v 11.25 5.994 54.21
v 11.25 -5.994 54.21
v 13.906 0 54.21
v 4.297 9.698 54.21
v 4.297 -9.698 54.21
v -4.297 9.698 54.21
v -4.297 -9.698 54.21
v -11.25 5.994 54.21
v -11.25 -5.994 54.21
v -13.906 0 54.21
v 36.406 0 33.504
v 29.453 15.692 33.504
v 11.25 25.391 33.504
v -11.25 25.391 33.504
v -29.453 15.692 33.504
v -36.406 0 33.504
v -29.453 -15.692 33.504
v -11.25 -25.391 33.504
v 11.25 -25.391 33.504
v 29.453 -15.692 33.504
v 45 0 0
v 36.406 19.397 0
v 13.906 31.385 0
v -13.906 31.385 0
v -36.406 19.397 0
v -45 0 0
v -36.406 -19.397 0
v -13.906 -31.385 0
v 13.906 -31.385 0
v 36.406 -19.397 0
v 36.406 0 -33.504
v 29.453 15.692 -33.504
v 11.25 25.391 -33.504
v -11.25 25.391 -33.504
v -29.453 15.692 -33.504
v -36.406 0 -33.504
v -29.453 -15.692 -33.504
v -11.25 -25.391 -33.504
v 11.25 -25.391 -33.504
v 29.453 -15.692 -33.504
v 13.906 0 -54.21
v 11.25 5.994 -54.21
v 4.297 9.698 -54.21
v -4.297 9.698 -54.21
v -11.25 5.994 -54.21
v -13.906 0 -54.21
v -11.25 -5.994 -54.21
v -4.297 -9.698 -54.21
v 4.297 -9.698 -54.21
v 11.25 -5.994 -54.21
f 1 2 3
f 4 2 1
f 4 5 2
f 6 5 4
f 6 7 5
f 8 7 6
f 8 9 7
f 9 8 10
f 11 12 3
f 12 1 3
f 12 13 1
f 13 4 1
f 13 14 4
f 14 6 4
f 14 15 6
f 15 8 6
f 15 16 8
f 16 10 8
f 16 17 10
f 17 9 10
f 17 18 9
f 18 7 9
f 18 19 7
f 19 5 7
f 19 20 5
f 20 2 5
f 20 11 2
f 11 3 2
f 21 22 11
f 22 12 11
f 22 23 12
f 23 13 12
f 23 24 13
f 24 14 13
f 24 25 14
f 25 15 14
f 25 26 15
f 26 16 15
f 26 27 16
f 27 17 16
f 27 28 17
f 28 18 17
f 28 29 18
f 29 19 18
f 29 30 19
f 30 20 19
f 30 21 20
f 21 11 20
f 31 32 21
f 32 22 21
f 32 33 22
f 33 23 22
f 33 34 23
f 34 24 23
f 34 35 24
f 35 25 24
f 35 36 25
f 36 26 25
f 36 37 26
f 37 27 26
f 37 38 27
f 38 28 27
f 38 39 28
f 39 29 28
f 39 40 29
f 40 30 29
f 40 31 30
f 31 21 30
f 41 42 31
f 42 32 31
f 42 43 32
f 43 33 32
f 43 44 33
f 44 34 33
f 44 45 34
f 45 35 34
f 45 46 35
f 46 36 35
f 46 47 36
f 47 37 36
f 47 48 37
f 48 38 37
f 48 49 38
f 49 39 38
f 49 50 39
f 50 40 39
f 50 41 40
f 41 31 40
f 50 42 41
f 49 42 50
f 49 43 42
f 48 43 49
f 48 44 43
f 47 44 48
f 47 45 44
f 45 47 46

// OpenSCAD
// Generated by SolidPython 1.0.1 on 2020-07-29 00:46:52


scale(v = [15, 11, 19]) {
	sphere(r = 3);
}
/***********************************************
*********      SolidPython code:      **********
************************************************
 
# import packages: SolidPython
from solid import *
from solid.utils import *
from itertools import chain, combinations, permutations


class Resize:

    def __init__(self, scad_file):
        self.scad_file = scad_file
        #self.scad_file = import_scad(scad_file)
        # cone/cylinder param:
        self.r1 = 0
        self.r2 = 0
        self.h = 0
        # rectangular prism param:
        self.w = 0
        self.l = 0
        # ellipse param:
        self.r = 0

    # import OpenScad code (file name corresponds to shape)


    # classify shape + parameters
    def assign(self, param1, param2, param3):
        if self.scad_file == 'cone.scad':
            self.r1 = param1
            self.r2 = param2
            self.h = param3
        elif self.scad_file == 'cylinder.scad':
            self.r1 = param1
            self.r2 = param2
            self.h = param3
        elif self.scad_file == 'rectangularPrism.scad':
            self.h = param1
            self.l = param2
            self.w = param3
        else:
            self.r = param1
            self.h = param2

    # resize parameters
    def iterate(self):
        x = range(3, 20, 2)
        i = 1
        if self.scad_file == 'cone.scad':
            tempList = list(permutations(x, 2))
            for temp in tempList:
                param1 = temp[0]
                param2 = temp[1]
                filepath = 'produced_scad_files/' + 'cone' + str(param1) + '_' + str(param2) + '_' + '.scad'
                scad_render_to_file(cylinder(h=param1, r1=param2, r2=0), filepath)

        elif self.scad_file == 'cylinder.scad':
            tempList = list(permutations(x, 3))
            for temp in tempList:
                param1 = temp[0]
                param2 = temp[1]
                filepath = 'produced_scad_files/' + 'cylinder' + str(param1) + '_' + str(param2) + '_' + '.scad'
                scad_render_to_file(cylinder(h=param1, r1=param2, r2=param2), filepath)

        elif self.scad_file == 'rectangularPrism.scad':
            tempList = list(permutations(x, 3))
            for temp in tempList:
                param1 = temp[0]
                param2 = temp[1]
                param3 = temp[2]
                filepath = 'produced_scad_files/' + 'rectangularPrism' + str(param1) + '_' + str(param2) + '_' + str(
                    param3) + '.scad'
                scad_render_to_file(cube(size=(param1, param2, param3)), filepath)

        elif self.scad_file == 'ellipse.scad':
            tempList = list(permutations(x, 4))
            for temp in tempList:
                param1 = temp[0]
                param2 = temp[1]
                param3 = temp[2]
                param4 = temp[3]
                filepath = 'produced_scad_files/' + 'ellipse' + str(param1) + '_' + str(param2) + '_' + str(param3) + '_' + str(param4) + '.scad'
                scad_render_to_file(scale([param1, param2, param3])(sphere(r=param4)), filepath)

    def render_to_scadfile(self):
        scad_render_to_file(scad, 'example.scad') 
 
************************************************/
